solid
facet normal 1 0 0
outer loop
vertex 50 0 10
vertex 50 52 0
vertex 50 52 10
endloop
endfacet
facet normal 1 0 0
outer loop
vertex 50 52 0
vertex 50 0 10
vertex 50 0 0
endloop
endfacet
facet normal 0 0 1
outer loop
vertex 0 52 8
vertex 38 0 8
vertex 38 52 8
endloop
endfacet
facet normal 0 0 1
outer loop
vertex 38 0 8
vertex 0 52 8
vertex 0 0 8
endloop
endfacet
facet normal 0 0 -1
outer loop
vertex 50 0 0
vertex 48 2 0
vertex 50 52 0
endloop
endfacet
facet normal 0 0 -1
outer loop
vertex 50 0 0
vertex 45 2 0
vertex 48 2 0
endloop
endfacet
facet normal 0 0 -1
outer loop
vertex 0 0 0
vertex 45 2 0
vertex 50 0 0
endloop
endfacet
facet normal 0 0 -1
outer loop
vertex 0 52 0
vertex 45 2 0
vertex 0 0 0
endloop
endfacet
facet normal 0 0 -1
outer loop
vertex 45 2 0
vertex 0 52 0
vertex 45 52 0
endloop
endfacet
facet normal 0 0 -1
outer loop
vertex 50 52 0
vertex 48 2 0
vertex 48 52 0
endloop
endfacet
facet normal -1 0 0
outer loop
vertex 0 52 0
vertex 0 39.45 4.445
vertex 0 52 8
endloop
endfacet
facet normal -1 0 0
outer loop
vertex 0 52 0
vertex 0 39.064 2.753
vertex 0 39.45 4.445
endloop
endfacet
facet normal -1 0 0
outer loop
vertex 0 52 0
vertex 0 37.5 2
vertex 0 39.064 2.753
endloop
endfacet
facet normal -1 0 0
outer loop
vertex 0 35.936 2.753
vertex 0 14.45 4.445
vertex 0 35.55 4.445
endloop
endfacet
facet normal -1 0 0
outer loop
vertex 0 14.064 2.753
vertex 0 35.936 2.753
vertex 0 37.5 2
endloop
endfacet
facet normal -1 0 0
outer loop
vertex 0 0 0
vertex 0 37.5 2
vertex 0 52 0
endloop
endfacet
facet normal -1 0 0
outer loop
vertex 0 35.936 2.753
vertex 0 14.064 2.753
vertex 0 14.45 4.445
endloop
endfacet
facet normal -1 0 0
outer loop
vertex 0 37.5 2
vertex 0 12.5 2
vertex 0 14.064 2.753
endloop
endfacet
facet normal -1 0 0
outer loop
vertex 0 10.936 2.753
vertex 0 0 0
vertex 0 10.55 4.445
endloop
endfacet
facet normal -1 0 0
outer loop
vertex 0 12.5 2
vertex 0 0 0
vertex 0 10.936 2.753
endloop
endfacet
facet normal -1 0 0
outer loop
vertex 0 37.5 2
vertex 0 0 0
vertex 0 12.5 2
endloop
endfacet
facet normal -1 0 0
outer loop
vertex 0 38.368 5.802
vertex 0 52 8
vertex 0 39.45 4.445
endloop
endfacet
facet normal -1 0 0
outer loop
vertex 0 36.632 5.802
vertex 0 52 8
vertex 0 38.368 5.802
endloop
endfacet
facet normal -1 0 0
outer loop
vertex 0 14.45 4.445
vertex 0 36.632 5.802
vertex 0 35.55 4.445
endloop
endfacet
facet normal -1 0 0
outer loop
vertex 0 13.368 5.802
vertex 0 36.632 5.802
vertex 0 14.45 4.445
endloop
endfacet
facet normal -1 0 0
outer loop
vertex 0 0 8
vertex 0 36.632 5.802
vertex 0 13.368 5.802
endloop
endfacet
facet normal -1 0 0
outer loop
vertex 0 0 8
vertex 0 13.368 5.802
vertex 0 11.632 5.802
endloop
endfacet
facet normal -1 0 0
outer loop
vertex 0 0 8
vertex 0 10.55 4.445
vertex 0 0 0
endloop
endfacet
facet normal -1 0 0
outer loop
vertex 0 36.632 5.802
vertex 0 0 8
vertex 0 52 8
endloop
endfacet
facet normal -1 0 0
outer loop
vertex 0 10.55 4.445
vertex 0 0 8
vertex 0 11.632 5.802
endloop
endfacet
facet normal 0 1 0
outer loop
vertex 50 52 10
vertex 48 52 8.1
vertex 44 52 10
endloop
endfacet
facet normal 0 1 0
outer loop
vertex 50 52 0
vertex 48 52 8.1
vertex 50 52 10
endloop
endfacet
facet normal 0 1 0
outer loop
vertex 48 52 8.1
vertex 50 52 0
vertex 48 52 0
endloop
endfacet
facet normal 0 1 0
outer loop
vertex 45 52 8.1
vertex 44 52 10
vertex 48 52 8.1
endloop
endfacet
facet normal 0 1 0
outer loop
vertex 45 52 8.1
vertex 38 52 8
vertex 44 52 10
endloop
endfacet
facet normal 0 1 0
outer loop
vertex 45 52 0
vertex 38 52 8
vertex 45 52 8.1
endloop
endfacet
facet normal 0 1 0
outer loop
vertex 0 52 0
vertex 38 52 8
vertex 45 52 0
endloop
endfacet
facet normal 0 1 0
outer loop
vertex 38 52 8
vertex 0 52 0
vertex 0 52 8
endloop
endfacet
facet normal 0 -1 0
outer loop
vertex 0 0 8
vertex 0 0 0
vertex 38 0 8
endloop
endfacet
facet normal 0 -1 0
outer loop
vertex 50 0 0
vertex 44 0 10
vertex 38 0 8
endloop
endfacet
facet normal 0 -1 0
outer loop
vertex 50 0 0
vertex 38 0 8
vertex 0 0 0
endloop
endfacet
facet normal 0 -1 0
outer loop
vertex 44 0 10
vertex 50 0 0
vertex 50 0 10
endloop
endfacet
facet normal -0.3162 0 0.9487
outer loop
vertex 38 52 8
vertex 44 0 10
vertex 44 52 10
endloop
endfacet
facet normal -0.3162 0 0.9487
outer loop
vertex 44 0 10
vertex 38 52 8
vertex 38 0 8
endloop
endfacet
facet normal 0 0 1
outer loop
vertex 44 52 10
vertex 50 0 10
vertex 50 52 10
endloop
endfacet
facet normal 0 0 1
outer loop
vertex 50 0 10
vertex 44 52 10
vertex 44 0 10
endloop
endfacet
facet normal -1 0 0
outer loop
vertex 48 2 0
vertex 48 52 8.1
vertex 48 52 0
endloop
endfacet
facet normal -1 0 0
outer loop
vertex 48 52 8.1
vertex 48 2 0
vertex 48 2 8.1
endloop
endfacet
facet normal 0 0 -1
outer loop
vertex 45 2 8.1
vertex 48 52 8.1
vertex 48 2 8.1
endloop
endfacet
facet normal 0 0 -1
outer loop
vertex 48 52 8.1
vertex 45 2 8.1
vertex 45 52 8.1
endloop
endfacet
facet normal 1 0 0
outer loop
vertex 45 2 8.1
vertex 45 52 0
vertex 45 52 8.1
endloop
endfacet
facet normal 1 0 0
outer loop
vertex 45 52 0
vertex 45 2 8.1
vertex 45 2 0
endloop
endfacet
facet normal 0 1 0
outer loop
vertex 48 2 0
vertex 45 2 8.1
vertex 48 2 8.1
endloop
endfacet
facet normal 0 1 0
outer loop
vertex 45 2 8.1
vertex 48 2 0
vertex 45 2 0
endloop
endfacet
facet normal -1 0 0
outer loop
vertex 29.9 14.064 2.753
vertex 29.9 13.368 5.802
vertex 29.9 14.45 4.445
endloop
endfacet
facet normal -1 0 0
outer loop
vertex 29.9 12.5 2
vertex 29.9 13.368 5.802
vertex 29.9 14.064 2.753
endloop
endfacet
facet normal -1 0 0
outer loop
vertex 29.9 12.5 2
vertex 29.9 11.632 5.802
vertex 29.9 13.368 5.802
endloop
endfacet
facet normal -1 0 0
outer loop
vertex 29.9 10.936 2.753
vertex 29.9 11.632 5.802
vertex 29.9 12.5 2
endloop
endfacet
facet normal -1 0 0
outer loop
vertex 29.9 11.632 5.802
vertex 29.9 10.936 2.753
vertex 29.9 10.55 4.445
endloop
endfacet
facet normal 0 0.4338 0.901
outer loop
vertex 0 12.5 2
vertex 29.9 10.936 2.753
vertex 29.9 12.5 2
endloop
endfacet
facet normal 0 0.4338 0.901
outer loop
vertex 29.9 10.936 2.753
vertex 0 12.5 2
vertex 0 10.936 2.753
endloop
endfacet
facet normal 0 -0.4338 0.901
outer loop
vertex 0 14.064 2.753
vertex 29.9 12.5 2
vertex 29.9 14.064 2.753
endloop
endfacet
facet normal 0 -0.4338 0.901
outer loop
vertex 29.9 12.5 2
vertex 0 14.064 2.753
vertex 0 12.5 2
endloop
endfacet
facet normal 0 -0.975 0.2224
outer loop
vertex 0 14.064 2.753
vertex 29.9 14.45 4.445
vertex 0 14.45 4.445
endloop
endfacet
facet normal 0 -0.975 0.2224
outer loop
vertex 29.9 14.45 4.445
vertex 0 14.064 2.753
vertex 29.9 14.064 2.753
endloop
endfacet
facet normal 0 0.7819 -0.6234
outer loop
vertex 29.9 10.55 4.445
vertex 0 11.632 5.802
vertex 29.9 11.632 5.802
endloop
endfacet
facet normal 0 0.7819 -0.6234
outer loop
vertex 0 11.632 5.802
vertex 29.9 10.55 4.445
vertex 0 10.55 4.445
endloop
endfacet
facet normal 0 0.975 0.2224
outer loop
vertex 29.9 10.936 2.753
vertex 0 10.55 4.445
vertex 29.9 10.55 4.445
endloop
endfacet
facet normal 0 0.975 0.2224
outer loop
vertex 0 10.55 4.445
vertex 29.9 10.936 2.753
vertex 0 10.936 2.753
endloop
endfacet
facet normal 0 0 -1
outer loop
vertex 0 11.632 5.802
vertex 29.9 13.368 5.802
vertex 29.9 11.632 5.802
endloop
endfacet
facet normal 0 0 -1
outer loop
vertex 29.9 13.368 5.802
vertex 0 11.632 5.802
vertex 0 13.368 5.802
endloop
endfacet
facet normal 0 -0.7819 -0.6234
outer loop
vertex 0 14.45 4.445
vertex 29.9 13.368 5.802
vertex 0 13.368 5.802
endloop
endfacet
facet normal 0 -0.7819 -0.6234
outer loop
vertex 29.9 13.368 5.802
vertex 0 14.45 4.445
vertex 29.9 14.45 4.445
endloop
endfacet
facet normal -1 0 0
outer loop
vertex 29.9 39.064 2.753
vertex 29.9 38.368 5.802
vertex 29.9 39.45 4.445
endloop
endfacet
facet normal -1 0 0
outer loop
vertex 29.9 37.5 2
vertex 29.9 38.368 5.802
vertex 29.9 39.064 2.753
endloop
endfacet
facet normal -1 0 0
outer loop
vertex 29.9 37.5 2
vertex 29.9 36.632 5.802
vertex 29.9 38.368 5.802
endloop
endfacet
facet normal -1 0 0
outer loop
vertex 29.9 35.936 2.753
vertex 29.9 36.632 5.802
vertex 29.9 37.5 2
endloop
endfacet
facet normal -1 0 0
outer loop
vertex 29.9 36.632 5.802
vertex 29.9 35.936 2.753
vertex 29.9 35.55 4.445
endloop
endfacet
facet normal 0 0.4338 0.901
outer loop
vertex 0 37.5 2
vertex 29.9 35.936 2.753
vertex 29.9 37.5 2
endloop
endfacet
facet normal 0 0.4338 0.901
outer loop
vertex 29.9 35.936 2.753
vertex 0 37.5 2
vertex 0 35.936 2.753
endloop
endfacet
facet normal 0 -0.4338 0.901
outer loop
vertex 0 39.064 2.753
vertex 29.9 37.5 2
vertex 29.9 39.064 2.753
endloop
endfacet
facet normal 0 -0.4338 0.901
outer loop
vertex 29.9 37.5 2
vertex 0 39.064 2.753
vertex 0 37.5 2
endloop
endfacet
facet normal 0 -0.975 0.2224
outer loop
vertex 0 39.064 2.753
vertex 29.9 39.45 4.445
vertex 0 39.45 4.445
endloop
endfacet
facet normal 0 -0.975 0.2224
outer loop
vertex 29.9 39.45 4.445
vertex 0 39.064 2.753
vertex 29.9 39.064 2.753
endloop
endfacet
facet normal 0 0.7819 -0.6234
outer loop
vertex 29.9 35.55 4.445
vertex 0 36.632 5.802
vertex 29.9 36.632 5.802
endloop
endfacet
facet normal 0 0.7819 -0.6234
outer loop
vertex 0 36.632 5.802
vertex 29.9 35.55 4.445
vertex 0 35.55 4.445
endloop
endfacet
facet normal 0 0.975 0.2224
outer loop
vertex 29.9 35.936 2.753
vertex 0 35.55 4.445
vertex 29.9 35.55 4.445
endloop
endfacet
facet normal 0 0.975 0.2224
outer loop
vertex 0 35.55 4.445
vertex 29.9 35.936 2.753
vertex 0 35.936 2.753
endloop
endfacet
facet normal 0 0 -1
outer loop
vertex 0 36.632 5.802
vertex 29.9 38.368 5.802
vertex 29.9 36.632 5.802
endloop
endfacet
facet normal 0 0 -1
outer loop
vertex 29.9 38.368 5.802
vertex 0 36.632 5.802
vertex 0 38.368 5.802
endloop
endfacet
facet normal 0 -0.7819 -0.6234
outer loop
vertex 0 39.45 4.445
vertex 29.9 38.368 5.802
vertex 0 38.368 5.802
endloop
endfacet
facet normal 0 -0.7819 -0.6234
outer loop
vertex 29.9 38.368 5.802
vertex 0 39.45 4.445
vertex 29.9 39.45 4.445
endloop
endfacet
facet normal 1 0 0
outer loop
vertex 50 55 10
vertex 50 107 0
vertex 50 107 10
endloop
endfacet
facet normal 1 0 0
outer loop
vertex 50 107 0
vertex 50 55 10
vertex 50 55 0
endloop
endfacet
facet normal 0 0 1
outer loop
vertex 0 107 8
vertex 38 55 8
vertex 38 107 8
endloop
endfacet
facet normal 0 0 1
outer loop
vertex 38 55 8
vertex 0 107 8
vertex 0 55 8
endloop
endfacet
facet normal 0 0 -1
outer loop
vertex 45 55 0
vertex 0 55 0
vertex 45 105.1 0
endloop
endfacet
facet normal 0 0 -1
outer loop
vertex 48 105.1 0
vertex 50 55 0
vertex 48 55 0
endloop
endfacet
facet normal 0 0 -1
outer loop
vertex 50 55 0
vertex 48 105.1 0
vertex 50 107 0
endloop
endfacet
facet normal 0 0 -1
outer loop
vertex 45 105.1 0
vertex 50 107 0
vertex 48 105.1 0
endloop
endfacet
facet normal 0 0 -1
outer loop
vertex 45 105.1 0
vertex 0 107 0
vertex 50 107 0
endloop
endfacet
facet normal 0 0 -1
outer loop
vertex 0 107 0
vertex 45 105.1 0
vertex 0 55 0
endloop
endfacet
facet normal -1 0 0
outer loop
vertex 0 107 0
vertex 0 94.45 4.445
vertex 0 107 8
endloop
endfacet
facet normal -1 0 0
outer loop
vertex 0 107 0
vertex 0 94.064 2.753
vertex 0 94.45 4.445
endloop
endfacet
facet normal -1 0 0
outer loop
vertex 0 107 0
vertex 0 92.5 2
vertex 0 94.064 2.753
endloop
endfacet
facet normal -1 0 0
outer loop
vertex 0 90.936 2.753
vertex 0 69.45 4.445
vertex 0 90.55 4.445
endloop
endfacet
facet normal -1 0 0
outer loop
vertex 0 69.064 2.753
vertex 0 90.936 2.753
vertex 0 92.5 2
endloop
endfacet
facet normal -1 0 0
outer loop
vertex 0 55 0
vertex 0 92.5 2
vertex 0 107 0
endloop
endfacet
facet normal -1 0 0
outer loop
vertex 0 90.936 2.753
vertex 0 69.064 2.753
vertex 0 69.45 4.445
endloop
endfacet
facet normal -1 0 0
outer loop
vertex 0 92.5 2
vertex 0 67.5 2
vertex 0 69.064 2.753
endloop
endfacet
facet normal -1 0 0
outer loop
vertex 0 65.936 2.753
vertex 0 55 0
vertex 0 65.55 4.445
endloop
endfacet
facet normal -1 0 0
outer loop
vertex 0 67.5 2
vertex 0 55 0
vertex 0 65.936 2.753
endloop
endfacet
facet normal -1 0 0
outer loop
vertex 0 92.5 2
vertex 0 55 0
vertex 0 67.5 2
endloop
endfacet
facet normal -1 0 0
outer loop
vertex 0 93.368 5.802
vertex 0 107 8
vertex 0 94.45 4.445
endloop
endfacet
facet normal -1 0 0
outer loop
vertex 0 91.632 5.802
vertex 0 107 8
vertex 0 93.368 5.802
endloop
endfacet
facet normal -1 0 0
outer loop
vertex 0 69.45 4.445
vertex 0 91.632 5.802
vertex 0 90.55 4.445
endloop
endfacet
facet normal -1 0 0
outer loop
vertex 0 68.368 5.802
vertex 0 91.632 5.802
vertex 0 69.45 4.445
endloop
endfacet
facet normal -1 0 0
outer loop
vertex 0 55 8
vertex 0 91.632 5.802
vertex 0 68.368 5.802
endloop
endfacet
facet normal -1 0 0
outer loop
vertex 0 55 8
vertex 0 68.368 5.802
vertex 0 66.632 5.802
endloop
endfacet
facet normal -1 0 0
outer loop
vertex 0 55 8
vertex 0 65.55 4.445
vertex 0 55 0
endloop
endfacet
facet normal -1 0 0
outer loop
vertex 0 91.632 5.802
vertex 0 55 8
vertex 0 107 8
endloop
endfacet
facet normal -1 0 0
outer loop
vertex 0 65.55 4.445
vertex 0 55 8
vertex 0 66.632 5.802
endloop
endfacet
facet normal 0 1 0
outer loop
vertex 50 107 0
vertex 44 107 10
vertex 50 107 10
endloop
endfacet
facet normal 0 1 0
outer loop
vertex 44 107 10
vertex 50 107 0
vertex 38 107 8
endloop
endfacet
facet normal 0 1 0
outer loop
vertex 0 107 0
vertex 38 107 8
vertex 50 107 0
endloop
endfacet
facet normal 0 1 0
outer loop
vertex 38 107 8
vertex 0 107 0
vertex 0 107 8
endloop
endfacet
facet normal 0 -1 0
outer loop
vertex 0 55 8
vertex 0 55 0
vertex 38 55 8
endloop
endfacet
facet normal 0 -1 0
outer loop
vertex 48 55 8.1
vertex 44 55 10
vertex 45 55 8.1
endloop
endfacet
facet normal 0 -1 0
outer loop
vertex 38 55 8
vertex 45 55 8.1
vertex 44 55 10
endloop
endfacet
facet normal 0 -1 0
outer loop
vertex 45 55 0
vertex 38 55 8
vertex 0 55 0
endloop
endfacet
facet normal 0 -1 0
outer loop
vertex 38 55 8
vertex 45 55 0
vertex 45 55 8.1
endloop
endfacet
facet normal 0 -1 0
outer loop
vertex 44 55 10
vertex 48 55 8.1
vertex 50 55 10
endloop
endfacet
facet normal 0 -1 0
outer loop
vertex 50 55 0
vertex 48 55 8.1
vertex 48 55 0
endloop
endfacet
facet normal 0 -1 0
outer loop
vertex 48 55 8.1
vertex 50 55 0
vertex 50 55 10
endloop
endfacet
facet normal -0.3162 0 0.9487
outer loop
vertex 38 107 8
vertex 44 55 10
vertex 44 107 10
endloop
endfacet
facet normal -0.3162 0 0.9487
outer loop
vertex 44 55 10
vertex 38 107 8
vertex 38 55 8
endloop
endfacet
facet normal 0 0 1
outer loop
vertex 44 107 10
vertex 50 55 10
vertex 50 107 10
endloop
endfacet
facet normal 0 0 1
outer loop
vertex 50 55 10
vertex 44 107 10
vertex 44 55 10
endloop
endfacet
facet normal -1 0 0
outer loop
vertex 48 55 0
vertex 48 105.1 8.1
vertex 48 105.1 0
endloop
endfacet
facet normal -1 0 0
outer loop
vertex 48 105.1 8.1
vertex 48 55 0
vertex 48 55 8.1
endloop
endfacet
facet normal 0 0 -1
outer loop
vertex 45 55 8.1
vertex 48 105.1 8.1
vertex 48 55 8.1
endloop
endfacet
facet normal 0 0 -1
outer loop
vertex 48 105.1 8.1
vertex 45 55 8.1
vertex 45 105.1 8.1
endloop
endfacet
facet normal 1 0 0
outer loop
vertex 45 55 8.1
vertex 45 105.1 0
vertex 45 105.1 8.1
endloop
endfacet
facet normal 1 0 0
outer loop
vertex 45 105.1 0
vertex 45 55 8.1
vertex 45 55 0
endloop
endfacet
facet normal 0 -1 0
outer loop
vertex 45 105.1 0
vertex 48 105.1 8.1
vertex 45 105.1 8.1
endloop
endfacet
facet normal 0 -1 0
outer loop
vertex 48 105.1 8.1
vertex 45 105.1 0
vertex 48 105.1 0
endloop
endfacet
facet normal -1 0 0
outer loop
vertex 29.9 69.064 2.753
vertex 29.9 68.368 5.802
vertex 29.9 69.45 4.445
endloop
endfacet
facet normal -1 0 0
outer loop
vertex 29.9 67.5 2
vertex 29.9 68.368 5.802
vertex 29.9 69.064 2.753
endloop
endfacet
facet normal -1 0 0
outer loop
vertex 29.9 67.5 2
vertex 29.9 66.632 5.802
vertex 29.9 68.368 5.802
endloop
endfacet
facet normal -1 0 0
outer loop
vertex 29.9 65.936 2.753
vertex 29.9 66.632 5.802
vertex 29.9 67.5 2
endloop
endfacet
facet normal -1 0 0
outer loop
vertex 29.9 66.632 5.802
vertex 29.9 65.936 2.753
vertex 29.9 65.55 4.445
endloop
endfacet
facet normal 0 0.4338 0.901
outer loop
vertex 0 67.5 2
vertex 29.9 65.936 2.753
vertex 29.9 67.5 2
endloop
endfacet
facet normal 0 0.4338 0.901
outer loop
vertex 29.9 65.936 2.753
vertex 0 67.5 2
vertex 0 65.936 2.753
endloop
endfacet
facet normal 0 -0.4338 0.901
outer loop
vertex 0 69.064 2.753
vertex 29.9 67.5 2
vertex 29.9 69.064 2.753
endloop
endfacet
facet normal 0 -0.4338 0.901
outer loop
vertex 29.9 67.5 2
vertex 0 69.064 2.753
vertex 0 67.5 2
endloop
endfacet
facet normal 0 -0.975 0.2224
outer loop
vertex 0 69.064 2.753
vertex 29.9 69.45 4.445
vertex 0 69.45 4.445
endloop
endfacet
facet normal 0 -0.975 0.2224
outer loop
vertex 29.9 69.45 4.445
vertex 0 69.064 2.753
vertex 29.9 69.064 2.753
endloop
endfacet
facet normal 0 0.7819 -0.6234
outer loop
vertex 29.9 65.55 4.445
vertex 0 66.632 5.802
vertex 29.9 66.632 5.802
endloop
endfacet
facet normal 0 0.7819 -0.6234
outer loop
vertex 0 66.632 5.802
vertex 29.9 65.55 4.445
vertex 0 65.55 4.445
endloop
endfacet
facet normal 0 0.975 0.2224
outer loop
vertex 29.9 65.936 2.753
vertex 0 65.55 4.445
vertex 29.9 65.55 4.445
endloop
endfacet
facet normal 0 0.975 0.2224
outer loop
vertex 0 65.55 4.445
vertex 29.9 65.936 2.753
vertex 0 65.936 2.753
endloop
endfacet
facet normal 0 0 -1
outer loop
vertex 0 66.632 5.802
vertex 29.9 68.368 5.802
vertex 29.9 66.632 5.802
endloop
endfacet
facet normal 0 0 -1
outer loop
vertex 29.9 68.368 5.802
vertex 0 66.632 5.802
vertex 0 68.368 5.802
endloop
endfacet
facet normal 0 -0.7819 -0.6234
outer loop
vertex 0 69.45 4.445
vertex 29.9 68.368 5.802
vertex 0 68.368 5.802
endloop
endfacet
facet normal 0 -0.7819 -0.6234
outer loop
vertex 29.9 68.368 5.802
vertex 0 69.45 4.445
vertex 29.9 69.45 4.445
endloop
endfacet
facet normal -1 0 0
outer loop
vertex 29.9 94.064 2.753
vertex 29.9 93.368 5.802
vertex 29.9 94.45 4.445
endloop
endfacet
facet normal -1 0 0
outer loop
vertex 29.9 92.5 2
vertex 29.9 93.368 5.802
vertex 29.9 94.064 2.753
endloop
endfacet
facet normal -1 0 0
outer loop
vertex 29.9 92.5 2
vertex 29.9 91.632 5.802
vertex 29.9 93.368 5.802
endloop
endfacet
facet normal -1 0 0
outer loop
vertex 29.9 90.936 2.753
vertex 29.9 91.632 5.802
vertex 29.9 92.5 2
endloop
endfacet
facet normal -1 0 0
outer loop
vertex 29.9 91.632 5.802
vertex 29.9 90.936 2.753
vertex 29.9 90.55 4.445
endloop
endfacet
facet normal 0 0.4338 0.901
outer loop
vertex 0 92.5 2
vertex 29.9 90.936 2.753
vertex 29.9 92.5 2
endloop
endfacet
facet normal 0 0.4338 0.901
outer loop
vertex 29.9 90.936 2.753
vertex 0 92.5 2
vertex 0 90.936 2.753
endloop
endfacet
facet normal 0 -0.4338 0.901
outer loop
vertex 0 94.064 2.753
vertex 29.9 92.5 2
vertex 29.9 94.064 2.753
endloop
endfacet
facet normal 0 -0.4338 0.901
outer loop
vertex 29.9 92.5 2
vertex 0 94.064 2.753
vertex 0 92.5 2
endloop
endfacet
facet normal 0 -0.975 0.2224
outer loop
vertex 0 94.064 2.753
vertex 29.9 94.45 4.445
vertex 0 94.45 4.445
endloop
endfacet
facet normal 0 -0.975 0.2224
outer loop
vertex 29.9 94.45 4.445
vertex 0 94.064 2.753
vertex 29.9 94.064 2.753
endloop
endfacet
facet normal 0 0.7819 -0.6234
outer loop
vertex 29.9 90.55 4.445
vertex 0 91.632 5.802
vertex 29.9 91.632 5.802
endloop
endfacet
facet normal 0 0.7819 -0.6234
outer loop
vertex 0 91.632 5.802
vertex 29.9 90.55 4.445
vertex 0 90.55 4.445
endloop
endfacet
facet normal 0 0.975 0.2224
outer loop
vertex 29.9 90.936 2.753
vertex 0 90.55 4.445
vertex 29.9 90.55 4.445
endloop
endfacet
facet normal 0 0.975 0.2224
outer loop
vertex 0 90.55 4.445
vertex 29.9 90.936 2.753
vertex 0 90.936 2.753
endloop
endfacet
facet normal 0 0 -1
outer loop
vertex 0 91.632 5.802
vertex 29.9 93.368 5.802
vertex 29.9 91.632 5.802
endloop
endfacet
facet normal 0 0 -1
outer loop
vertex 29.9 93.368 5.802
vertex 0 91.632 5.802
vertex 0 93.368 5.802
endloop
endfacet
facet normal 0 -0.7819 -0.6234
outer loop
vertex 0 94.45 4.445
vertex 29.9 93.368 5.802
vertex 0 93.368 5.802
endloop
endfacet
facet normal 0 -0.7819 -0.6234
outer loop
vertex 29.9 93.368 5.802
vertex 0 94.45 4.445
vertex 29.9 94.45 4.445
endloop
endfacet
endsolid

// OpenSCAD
epsilon=0.1;
acryl_thick=3;
side_high=50;
side_thick=8;
side_len=50;
hold_thick=2;
screw_predrill=2;

module side(right=1) {
    difference() {
	union() {
	    // Base block.
	    cube([side_high, side_len + hold_thick, side_thick]);
	    // Block that covers where the acryl holder is

	    hull() {
		translate([side_high-3*hold_thick, 0, side_thick]) cube([3 * hold_thick, side_len + hold_thick, hold_thick]);
		translate([side_high-6*hold_thick, 0, side_thick-hold_thick]) cube([3 * hold_thick, side_len + hold_thick, hold_thick]);
	    }
	}
	
	// Acryl holder.
	translate([side_high - acryl_thick - hold_thick, right ? hold_thick : -epsilon, -epsilon]) cube([acryl_thick, side_len + 2*epsilon, side_thick+2*epsilon]);

	// Drill holes.
	translate([-epsilon,1*side_len/4,side_thick/2]) rotate([0, 90, 0]) cylinder(r=screw_predrill, h=side_high - 20);
	translate([-epsilon,3*side_len/4,side_thick/2]) rotate([0, 90, 0]) cylinder(r=screw_predrill, h=side_high - 20);    
    }
}

side(right=1);
translate([0, side_len + 5, 0]) side(right=0);
